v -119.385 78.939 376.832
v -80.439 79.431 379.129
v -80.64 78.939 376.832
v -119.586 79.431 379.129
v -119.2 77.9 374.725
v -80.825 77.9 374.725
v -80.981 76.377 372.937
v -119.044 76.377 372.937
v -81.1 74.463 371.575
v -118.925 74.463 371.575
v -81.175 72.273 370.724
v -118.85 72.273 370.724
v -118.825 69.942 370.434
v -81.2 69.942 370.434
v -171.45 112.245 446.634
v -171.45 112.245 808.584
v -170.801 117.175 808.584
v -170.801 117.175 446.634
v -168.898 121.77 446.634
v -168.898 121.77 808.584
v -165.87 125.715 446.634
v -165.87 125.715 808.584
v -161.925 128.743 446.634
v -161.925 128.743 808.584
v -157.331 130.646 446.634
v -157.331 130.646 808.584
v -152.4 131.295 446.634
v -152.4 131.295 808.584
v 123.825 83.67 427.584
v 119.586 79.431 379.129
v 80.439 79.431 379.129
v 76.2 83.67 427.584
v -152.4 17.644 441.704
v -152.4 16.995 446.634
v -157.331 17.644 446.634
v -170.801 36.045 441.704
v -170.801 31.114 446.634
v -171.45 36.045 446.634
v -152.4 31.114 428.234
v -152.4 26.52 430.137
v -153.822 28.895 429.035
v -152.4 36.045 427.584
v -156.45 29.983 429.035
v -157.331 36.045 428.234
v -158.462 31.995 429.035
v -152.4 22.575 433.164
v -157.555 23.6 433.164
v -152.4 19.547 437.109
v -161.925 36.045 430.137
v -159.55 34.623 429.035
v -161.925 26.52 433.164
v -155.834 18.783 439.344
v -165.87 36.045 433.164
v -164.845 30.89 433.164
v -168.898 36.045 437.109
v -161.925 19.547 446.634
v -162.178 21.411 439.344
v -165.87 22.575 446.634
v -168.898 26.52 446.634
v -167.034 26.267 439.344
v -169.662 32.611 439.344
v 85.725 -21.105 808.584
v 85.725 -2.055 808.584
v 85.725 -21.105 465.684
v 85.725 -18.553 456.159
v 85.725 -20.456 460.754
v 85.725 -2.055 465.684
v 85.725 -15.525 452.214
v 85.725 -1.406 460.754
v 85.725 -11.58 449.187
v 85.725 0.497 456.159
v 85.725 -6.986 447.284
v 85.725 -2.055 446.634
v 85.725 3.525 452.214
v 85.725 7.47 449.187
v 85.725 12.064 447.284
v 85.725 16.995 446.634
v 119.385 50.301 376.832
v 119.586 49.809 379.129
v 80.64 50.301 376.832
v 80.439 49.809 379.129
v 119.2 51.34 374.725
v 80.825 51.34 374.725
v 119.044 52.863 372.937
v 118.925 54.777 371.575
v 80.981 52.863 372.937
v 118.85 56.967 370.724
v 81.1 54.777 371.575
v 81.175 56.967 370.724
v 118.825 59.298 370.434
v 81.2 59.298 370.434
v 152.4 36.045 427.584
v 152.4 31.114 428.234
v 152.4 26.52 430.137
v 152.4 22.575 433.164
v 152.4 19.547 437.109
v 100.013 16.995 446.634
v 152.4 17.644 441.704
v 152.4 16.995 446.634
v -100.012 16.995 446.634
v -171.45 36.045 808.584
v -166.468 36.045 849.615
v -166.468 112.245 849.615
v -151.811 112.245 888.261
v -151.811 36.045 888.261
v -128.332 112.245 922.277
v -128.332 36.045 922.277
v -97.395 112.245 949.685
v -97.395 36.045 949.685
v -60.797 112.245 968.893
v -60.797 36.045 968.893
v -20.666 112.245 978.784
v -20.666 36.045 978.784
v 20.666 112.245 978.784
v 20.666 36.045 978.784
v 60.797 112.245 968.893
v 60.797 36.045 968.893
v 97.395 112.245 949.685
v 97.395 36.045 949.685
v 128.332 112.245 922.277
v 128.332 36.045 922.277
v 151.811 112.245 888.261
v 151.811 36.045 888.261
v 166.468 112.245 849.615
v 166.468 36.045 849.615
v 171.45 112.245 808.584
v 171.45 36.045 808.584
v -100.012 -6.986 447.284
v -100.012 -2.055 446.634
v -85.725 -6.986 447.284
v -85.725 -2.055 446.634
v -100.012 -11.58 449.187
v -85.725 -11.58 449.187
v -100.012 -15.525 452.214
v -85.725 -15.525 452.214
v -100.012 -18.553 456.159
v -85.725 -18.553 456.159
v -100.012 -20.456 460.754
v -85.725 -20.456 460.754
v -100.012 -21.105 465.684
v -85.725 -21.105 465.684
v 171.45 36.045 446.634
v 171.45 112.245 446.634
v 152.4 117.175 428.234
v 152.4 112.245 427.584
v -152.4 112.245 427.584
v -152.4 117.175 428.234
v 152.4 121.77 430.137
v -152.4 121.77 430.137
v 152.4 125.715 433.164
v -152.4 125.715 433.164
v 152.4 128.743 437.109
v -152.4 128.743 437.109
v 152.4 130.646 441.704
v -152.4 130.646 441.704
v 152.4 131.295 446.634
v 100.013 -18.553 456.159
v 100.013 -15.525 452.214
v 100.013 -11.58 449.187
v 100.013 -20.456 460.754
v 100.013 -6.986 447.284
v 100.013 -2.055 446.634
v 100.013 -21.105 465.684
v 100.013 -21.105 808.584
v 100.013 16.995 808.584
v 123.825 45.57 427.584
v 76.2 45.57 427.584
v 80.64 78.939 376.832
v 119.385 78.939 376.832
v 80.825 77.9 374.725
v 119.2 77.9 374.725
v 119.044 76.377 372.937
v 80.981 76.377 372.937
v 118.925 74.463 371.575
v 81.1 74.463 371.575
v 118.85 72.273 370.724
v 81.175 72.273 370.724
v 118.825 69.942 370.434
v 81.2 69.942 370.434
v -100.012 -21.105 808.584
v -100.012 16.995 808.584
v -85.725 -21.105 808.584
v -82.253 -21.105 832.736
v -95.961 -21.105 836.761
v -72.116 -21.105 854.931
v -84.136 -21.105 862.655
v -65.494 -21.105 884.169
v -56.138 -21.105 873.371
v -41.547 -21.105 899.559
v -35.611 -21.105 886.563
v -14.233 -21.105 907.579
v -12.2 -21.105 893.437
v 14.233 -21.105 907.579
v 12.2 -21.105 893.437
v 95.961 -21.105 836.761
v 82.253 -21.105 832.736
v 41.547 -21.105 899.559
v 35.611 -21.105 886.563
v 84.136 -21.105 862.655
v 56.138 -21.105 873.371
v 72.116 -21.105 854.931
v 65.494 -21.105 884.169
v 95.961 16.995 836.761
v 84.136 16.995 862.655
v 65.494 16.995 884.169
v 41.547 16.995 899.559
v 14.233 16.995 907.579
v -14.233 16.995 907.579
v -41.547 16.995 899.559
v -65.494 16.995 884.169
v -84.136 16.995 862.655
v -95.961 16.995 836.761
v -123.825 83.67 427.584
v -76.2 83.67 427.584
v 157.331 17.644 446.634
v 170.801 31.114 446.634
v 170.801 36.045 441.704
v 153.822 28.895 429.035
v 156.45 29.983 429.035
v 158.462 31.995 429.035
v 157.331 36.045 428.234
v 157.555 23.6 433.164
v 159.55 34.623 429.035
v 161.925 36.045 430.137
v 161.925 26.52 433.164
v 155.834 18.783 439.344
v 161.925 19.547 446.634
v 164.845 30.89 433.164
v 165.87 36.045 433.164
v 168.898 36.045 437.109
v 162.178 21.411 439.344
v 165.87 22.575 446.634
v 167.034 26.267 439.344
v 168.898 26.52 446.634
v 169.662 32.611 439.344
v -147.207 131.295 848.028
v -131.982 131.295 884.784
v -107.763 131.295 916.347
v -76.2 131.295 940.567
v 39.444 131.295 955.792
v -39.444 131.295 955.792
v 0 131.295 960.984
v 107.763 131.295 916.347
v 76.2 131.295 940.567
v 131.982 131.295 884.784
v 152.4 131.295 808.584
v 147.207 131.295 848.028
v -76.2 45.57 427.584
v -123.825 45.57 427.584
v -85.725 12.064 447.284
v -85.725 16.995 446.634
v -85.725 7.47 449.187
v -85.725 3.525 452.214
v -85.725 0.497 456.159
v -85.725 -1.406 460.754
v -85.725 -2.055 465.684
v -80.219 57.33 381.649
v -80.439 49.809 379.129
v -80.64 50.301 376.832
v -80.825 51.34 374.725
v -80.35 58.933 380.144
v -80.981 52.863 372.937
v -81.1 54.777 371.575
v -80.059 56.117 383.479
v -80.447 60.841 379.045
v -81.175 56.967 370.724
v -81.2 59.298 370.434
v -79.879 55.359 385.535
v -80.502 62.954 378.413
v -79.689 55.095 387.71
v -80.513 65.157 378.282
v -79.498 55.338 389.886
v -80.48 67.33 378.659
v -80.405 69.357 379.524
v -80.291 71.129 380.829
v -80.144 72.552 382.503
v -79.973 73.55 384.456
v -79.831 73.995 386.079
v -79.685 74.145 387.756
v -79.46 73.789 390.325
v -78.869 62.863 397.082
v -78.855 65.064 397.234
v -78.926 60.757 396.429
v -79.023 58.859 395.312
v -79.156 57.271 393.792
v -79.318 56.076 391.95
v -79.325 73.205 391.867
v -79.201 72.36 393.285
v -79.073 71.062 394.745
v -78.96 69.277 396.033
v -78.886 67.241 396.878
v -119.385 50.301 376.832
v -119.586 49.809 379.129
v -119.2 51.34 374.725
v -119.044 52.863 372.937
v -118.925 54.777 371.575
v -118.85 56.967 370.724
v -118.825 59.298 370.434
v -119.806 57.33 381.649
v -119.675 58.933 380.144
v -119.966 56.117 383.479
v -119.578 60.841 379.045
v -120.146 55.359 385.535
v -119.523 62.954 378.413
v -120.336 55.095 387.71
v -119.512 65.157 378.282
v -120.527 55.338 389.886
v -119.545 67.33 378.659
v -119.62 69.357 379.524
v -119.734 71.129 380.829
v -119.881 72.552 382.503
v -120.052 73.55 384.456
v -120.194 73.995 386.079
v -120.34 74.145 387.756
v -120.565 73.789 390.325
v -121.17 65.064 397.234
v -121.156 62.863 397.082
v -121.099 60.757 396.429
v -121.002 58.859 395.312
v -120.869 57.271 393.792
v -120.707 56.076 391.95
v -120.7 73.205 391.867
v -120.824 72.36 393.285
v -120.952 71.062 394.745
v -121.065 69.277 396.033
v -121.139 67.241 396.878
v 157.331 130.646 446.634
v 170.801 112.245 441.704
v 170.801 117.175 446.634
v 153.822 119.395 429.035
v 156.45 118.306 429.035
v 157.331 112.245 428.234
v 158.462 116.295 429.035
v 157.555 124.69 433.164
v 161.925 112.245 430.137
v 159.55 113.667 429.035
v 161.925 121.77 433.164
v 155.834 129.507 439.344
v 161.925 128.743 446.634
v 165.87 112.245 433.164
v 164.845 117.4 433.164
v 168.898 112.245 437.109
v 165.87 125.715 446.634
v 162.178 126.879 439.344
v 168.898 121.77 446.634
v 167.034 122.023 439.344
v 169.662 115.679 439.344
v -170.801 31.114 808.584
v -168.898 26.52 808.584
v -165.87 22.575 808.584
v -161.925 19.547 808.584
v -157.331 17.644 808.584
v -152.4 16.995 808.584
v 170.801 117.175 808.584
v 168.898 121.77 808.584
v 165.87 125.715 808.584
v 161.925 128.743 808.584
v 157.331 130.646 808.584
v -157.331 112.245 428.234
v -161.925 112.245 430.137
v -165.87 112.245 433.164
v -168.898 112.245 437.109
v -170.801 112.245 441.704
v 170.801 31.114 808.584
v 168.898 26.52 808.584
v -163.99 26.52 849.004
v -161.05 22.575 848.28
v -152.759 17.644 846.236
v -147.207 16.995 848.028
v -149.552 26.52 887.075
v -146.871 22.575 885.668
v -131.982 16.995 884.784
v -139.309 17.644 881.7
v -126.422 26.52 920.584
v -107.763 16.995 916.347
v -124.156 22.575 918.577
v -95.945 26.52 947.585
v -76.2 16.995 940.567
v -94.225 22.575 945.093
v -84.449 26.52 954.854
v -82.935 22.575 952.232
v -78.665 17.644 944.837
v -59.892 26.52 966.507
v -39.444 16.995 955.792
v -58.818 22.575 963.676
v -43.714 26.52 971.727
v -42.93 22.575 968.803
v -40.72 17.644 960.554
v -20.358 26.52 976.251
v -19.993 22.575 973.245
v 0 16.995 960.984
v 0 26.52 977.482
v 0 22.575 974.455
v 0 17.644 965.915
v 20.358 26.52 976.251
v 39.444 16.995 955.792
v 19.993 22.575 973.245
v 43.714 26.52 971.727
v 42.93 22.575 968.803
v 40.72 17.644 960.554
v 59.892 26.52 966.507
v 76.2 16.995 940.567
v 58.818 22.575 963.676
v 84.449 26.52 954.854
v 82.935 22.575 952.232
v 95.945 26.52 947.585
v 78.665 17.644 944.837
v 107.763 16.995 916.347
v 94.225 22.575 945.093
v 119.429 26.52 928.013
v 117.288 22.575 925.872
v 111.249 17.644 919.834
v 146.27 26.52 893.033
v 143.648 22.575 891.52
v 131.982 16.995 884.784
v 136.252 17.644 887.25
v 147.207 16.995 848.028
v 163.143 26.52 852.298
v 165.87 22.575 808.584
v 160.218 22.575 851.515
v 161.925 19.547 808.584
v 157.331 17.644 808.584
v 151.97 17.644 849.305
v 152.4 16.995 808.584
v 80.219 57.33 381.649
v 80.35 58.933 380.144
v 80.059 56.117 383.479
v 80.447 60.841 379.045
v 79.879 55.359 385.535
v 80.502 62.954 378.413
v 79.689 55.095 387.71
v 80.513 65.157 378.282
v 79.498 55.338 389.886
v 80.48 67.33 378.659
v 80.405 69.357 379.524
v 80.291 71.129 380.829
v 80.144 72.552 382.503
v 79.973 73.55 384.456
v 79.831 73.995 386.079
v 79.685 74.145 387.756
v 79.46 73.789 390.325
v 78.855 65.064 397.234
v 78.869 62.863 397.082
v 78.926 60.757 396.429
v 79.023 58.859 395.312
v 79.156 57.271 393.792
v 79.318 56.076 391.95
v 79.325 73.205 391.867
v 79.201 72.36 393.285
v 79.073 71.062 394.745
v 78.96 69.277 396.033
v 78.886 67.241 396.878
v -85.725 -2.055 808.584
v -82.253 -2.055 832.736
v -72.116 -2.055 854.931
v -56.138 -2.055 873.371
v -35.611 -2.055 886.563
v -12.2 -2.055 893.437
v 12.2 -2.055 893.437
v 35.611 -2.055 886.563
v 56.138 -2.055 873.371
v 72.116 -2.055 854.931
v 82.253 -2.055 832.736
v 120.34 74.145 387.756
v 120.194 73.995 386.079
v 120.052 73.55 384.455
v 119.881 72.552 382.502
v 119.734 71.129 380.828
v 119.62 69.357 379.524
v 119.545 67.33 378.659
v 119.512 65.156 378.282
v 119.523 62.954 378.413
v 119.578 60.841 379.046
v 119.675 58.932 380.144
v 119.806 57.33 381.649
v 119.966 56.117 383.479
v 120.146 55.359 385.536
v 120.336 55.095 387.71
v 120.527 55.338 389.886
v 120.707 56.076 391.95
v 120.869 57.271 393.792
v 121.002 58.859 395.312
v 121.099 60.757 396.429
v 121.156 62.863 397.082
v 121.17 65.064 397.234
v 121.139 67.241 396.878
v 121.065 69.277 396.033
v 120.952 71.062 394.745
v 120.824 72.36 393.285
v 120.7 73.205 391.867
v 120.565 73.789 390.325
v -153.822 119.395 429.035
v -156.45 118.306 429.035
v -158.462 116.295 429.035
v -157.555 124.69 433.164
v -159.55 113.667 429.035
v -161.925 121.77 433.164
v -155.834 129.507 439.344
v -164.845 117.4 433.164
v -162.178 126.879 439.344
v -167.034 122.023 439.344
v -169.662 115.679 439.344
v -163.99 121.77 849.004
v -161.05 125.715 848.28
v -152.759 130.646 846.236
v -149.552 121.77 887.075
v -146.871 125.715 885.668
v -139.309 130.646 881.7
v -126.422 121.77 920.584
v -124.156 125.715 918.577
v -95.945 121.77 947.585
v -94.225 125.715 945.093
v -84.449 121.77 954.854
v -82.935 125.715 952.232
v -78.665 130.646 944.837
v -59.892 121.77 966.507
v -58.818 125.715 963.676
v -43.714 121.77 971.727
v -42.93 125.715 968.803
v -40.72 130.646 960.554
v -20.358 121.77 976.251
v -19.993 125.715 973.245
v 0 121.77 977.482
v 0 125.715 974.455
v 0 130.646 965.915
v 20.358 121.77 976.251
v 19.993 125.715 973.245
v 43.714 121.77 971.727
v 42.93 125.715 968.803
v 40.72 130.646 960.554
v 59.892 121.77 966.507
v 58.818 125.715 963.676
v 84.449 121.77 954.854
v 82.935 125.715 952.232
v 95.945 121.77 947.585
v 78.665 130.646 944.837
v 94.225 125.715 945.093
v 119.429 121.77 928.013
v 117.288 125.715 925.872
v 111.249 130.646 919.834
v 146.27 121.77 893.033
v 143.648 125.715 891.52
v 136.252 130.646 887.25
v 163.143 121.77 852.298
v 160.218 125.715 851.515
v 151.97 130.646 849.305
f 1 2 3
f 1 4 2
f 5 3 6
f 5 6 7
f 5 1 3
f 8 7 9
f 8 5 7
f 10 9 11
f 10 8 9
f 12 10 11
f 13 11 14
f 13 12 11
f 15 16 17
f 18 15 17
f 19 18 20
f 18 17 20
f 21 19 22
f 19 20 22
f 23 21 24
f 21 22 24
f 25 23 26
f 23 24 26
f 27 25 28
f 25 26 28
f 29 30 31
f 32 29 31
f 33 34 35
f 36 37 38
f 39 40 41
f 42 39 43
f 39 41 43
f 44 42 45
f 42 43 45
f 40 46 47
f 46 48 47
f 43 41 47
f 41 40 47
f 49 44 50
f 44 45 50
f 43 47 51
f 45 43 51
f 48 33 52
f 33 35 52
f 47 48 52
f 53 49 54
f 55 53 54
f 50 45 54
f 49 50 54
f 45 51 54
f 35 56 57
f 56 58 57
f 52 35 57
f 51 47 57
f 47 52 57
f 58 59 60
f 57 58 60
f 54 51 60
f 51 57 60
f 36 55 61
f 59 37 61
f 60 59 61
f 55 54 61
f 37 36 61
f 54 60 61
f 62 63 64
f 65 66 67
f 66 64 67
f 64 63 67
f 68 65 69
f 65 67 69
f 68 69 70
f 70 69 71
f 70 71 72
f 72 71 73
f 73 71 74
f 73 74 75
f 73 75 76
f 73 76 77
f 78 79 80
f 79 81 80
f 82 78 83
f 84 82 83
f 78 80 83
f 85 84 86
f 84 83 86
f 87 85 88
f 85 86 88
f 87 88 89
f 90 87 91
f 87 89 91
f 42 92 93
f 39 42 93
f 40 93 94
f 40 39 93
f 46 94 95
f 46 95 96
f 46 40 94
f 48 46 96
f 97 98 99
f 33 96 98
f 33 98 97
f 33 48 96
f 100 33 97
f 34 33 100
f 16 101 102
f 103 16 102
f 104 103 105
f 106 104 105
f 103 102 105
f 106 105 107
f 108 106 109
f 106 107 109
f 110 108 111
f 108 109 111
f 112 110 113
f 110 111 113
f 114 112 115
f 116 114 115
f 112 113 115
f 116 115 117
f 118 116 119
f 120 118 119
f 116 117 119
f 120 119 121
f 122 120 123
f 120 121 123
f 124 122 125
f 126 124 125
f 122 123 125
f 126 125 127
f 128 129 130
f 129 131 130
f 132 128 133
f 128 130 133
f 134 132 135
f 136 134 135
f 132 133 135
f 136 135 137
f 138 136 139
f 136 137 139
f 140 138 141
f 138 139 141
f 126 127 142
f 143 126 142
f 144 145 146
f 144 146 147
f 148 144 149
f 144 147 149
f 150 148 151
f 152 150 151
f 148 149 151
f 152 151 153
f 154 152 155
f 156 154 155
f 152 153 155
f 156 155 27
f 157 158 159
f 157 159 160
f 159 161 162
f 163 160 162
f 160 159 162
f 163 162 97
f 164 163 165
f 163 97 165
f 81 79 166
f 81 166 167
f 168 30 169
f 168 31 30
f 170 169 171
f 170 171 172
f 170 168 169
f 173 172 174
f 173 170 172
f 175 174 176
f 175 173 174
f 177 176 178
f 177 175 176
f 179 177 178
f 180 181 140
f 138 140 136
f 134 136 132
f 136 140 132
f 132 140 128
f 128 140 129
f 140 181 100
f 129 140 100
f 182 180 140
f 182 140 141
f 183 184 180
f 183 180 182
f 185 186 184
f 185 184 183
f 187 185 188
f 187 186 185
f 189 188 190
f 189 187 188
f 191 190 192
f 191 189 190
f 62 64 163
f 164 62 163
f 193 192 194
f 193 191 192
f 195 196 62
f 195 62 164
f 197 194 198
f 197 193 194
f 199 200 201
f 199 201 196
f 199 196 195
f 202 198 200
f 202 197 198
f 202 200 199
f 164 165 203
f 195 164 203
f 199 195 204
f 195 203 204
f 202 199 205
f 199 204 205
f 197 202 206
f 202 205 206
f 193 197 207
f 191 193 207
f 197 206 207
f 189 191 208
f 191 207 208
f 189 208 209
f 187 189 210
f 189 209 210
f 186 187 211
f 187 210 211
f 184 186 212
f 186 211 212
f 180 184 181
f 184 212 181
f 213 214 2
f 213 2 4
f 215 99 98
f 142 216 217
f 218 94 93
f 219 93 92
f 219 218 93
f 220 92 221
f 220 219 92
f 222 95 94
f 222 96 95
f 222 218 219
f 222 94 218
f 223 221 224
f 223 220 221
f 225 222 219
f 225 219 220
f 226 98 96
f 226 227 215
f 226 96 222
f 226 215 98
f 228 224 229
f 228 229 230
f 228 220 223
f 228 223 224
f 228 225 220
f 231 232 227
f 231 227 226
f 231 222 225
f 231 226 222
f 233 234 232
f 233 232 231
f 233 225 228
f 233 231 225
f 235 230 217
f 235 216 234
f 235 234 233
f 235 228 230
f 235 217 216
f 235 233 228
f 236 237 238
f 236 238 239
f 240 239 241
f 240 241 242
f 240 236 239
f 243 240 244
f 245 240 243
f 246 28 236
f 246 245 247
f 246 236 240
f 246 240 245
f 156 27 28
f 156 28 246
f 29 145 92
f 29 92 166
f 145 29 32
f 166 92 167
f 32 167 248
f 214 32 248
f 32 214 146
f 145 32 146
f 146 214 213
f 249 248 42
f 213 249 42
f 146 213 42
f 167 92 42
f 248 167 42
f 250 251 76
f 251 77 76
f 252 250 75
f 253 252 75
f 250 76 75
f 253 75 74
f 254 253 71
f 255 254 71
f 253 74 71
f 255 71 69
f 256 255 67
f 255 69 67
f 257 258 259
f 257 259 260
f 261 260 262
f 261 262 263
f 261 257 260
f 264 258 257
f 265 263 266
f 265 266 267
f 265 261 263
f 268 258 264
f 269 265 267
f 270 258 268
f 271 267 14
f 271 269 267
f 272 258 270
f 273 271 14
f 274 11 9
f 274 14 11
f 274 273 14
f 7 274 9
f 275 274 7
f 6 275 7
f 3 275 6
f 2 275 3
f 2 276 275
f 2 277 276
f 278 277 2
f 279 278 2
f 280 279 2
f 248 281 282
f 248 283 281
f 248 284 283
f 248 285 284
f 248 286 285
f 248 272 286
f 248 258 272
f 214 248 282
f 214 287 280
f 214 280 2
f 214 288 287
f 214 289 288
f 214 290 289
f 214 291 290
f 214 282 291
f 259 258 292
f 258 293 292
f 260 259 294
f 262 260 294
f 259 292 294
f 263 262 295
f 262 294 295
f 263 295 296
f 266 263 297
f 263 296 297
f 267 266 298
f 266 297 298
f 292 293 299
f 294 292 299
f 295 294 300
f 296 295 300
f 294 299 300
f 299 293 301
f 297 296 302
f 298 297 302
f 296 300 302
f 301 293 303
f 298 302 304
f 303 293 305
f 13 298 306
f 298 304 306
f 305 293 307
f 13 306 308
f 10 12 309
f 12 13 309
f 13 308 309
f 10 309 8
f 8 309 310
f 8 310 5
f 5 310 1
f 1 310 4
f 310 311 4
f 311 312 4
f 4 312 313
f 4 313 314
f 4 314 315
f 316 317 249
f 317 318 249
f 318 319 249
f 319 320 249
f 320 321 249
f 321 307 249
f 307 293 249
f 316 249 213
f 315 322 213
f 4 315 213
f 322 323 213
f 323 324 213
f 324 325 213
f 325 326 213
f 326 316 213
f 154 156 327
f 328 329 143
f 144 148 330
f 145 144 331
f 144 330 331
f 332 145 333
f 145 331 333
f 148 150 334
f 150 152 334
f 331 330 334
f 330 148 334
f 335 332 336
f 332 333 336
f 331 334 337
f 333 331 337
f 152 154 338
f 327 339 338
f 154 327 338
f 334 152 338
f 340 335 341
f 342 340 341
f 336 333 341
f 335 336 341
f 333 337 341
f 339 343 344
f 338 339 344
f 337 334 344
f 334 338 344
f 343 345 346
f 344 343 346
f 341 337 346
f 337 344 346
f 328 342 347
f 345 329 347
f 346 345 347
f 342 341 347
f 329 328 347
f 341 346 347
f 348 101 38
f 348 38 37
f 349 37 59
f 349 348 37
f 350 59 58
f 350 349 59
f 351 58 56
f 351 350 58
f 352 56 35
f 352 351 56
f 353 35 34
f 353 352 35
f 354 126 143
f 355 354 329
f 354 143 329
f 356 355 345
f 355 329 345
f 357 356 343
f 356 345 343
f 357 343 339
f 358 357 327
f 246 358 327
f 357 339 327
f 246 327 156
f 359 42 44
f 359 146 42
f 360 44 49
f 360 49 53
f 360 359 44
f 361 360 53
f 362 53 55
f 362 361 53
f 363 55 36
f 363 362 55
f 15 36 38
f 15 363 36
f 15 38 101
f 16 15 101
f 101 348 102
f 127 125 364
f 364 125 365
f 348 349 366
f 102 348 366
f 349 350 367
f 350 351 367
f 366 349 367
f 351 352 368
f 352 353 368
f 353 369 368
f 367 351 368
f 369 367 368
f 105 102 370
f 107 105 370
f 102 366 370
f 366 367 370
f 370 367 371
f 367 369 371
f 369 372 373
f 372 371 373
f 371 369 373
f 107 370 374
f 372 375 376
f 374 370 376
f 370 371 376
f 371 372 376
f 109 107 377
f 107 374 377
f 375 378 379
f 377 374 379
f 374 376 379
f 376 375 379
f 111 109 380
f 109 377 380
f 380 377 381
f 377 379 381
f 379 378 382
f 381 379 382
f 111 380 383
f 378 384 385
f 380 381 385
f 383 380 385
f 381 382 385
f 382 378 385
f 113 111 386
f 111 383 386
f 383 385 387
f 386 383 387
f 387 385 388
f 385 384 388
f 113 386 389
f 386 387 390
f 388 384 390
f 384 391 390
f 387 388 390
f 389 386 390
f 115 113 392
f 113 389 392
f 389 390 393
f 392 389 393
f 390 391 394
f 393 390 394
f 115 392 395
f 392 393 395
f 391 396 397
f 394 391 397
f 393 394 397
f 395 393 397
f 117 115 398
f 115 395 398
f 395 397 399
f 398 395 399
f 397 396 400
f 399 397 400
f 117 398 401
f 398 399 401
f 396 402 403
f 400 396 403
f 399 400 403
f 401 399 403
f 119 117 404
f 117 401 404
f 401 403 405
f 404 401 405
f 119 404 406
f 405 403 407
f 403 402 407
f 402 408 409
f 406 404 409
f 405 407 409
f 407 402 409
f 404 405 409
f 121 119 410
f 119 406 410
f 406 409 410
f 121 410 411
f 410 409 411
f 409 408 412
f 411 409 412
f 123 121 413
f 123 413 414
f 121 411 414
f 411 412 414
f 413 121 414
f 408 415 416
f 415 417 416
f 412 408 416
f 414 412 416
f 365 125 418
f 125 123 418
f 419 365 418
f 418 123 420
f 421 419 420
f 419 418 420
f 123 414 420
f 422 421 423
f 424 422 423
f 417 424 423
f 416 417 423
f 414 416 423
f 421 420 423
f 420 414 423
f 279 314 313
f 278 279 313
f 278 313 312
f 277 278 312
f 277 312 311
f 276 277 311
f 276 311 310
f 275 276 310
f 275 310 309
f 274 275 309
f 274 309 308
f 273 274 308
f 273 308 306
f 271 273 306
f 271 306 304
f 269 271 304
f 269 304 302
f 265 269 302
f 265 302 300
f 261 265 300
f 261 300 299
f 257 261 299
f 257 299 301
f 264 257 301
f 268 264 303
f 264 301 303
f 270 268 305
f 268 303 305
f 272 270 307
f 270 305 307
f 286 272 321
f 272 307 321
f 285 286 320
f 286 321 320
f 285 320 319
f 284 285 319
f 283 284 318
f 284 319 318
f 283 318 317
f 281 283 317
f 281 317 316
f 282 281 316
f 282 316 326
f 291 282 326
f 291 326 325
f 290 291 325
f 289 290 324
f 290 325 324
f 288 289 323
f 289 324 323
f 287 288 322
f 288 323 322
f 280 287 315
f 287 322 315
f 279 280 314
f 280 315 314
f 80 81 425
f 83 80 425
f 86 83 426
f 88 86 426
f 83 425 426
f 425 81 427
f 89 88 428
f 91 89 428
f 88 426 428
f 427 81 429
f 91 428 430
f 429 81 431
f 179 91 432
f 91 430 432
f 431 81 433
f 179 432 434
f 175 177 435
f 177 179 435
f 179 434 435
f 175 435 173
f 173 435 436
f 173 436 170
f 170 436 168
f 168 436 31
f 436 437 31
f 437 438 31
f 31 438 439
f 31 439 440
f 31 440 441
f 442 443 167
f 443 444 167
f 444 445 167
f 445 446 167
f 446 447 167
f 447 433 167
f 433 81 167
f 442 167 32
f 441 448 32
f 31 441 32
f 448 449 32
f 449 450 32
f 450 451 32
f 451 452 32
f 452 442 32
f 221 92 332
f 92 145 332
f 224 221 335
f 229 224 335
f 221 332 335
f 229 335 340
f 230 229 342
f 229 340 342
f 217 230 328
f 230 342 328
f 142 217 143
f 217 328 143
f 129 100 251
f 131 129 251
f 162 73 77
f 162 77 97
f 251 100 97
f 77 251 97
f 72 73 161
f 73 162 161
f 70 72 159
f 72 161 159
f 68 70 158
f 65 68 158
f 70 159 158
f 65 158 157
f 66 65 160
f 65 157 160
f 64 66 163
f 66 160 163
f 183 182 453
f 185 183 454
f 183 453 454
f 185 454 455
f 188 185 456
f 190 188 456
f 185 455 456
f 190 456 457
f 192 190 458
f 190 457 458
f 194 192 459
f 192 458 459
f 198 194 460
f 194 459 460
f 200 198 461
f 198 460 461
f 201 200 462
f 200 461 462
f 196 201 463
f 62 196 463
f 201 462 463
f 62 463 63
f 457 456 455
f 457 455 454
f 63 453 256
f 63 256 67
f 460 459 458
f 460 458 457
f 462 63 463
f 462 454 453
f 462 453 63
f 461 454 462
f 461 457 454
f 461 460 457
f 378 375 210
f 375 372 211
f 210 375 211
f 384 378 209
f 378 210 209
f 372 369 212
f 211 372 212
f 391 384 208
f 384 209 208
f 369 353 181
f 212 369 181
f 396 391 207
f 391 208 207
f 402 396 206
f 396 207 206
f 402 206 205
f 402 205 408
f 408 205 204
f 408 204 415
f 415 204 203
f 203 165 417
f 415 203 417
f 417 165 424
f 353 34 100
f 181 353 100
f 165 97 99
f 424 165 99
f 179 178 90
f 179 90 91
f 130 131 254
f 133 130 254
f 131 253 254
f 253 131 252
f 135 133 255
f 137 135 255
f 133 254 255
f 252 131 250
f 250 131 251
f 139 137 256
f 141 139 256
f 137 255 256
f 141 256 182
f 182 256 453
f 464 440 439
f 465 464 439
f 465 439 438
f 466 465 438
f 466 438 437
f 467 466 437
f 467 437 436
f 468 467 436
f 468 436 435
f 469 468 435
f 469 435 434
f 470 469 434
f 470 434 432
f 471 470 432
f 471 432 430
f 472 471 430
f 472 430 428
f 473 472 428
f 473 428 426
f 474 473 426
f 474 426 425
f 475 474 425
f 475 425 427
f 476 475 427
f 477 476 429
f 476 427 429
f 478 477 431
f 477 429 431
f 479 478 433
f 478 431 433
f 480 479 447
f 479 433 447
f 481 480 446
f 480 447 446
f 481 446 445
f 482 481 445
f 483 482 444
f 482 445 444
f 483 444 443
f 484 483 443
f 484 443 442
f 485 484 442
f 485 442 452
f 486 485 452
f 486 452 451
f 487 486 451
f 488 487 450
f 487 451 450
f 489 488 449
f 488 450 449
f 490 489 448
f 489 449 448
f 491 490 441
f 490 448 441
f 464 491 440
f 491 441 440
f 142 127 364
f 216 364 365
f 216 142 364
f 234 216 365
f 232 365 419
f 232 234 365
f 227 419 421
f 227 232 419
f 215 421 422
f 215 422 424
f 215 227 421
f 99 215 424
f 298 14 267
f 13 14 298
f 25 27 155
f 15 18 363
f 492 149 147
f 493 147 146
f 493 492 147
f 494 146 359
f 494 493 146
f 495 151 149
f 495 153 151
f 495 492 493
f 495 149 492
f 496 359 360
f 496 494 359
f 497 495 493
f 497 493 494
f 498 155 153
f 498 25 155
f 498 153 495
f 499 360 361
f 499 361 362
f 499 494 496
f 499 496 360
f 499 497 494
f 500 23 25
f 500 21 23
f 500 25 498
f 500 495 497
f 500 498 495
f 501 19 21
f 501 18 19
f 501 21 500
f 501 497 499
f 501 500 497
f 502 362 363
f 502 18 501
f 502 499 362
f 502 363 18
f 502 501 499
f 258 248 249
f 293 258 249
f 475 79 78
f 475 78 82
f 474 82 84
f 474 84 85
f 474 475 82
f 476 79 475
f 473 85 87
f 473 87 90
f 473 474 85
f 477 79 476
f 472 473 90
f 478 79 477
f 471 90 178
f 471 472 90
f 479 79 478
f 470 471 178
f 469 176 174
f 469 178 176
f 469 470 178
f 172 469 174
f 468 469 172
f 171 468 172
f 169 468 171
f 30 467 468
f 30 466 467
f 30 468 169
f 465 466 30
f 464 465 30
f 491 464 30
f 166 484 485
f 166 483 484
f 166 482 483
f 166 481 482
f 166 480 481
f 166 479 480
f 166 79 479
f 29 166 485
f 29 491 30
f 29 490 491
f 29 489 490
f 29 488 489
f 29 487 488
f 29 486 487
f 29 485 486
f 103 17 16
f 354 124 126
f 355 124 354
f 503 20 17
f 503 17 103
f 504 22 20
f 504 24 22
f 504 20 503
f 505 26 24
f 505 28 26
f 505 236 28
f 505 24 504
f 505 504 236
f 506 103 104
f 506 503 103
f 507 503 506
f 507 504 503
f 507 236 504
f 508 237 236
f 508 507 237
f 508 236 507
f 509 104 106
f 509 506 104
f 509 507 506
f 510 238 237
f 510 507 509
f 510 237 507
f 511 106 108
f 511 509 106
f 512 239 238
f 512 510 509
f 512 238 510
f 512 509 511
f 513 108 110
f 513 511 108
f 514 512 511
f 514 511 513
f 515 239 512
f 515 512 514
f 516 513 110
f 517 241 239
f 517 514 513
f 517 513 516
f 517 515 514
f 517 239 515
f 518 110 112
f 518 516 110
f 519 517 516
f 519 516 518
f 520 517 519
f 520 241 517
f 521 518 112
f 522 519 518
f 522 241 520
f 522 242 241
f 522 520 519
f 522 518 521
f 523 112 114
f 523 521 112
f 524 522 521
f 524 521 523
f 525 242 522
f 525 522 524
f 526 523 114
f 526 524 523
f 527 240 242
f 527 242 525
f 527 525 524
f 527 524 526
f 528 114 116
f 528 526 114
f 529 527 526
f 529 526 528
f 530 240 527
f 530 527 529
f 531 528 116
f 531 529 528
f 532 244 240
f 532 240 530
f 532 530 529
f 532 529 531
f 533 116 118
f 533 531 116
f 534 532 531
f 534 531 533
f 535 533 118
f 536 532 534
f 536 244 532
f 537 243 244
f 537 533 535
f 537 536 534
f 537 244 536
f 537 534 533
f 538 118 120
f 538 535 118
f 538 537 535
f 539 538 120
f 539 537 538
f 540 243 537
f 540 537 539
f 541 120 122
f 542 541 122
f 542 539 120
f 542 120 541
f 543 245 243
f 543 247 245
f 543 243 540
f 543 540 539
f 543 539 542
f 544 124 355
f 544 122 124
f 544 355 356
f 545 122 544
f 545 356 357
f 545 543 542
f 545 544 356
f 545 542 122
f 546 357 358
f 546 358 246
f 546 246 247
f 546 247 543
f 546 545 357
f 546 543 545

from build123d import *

# Parameters (mm, degrees)
BOSS_EXTRUDE1_DEPTH           = 152.4
FILLET1_R                     = 25.4
BOSS_EXTRUDE2_DEPTH           = 50.8
BOSS_EXTRUDE3_DEPTH           = 25.4
FILLET2_R                     = 25.4
SKETCH5_W                     = 63.5
SKETCH5_H                     = 50.8
BOSS_EXTRUDE4_DEPTH           = 76.2
BOSS_EXTRUDE4_DRAFT           = 5
BOSS_EXTRUDE4_PROFILE_2_DEPTH = 76.2
BOSS_EXTRUDE4_PROFILE_2_DRAFT = 5
FILLET3_R                     = 12.7
SKETCH7_RX                    = 12.7
SKETCH7_RY                    = 12.651672666
CUT_EXTRUDE2_DEPTH            = 1182.416868754
SCALE1_SCALE                  = 0.75


with BuildPart() as part:
    # Sketch1 → Boss-Extrude1 (new body)
    with BuildSketch(Plane(origin=(0, 0, 0), x_dir=(1, 0, 0), z_dir=(0, 1, 0))):
        with BuildLine():
            Line((228.6, -342.051110312), (-228.6, -342.051110312))
            Line((-228.6, -342.051110312), (-228.6, -850.051110312))
            ThreePointArc((-228.6, -850.051110312), (0, -1078.651110312), (228.6, -850.051110312))
            Line((228.6, -850.051110312), (228.6, -342.051110312))
        make_face()
    extrude(amount=BOSS_EXTRUDE1_DEPTH)

    # Fillet1
    fillet1_edges = [part.edges().sort_by_distance(p)[0] for p in [
        (-228.6, 152.4, 596.051110312),
        (0, 152.4, 1078.651110312),
        (228.6, 152.4, 596.051110312),
        (0, 152.4, 342.051110312),
        (228.6, 0, 596.051110312),
        (0, 0, 1078.651110312),
        (-228.6, 0, 596.051110312),
        (0, 0, 342.051110312),
        (228.6, 76.2, 342.051110312),
        (-228.6, 76.2, 342.051110312),
    ]]
    fillet(fillet1_edges, radius=FILLET1_R)

    # Sketch3 → Boss-Extrude2 (add)
    with BuildSketch(Plane.XZ):
        with BuildLine():
            Line((-133.35, 850.051110312), (-133.35, 367.451110312))
            Line((-133.35, 367.451110312), (-114.3, 367.451110312))
            Line((-114.3, 367.451110312), (-114.3, 850.051110312))
            ThreePointArc((-114.3, 850.051110312), (0, 964.351110312), (114.3, 850.051110312))
            Line((114.3, 850.051110312), (114.3, 367.451110312))
            Line((114.3, 367.451110312), (133.35, 367.451110312))
            Line((133.35, 367.451110312), (133.35, 850.051110312))
            ThreePointArc((133.35, 850.051110312), (0, 983.401110312), (-133.35, 850.051110312))
        make_face()
    extrude(amount=BOSS_EXTRUDE2_DEPTH)

    # Sketch4 → Boss-Extrude3 (add)
    with BuildSketch(Plane.XZ):
        with BuildLine():
            Line((-114.3, 850.051110312), (-114.3, 367.451110312))
            Line((-114.3, 367.451110312), (114.3, 367.451110312))
            Line((114.3, 367.451110312), (114.3, 850.051110312))
            ThreePointArc((114.3, 850.051110312), (0, 964.351110312), (-114.3, 850.051110312))
        make_face()
    extrude(amount=BOSS_EXTRUDE3_DEPTH)

    # Fillet2
    fillet2_edges = [part.edges().sort_by_distance(p)[0] for p in [
        (123.825, -50.8, 367.451110312),
        (-123.825, -50.8, 367.451110312),
        (0, -25.4, 367.451110312),
    ]]
    fillet(fillet2_edges, radius=FILLET2_R - 0.0001)  # a hair under: the kernel refuses the full size


with BuildPart() as boss_extrude4_tool:
    # Sketch5 → Boss-Extrude4 (with draft: the straight prism first)
    with BuildSketch(Plane(origin=(0, 0, 342.051110312), x_dir=(-1, 0, 0), z_dir=(0, 0, -1))):
        with Locations((133.35, 63.5)):
            Rectangle(SKETCH5_W, SKETCH5_H)
    extrude(amount=BOSS_EXTRUDE4_DEPTH)
    # Boss-Extrude4: the draft: its side faces are tilted about the plane it starts from
    boss_extrude4_sides = [boss_extrude4_tool.faces().sort_by_distance(p)[0] for p in [
        (-101.6, 63.5, 303.951110312),
        (-133.35, 38.1, 303.951110312),
        (-165.1, 63.5, 303.951110312),
        (-133.35, 88.9, 303.951110312),
    ]]
    draft(boss_extrude4_sides, Plane(origin=(0, 0, 342.051110312), x_dir=(-1, 0, 0), z_dir=(0, 0, -1)), BOSS_EXTRUDE4_DRAFT)


with BuildPart() as part_1:
    add(part.part)

    # Boss-Extrude4: add boss_extrude4_tool
    add(boss_extrude4_tool.part)


with BuildPart() as boss_extrude4_profile_2_tool:
    # Sketch5 → Boss-Extrude4 profile 2 (with draft: the straight prism first)
    with BuildSketch(Plane(origin=(0, 0, 342.051110312), x_dir=(-1, 0, 0), z_dir=(0, 0, -1))):
        with Locations((-133.35, 63.5)):
            Rectangle(SKETCH5_W, SKETCH5_H)
    extrude(amount=BOSS_EXTRUDE4_PROFILE_2_DEPTH)
    # Boss-Extrude4 profile 2: the draft: its side faces are tilted about the plane it starts from
    boss_extrude4_profile_2_sides = [boss_extrude4_profile_2_tool.faces().sort_by_distance(p)[0] for p in [
        (101.6, 63.5, 303.951110312),
        (133.35, 88.9, 303.951110312),
        (165.1, 63.5, 303.951110312),
        (133.35, 38.1, 303.951110312),
    ]]
    draft(boss_extrude4_profile_2_sides, Plane(origin=(0, 0, 342.051110312), x_dir=(-1, 0, 0), z_dir=(0, 0, -1)), BOSS_EXTRUDE4_PROFILE_2_DRAFT)


with BuildPart() as part_2:
    add(part_1.part)

    # Boss-Extrude4 profile 2: add boss_extrude4_profile_2_tool
    add(boss_extrude4_profile_2_tool.part)

    # Fillet3
    fillet3_edges = [part_2.edges().sort_by_distance(p)[0] for p in [
        (133.35, 82.233363839, 265.851110312),
        (133.35, 44.766636161, 265.851110312),
        (-133.35, 44.766636161, 265.851110312),
        (-133.35, 82.233363839, 265.851110312),
    ]]
    fillet(fillet3_edges, radius=FILLET3_R)

    # Sketch7 → Cut-Extrude2 (cut, through all)
    with BuildSketch(Plane.ZY.offset(228.6)):
        with Locations(Location((288.946136063, 63.5), (0, 0, 90))):
            Ellipse(SKETCH7_RX, SKETCH7_RY)
    extrude(amount=-CUT_EXTRUDE2_DEPTH, mode=Mode.SUBTRACT)


with BuildPart() as part_3:
    # Scale1: scaled about (1.9e-07, 67.979865598, 684.18432939)
    add(part_2.part.scale(SCALE1_SCALE).moved(Location((4.8e-08, 16.9949664, 171.046082348))))


solid = part_3.part
